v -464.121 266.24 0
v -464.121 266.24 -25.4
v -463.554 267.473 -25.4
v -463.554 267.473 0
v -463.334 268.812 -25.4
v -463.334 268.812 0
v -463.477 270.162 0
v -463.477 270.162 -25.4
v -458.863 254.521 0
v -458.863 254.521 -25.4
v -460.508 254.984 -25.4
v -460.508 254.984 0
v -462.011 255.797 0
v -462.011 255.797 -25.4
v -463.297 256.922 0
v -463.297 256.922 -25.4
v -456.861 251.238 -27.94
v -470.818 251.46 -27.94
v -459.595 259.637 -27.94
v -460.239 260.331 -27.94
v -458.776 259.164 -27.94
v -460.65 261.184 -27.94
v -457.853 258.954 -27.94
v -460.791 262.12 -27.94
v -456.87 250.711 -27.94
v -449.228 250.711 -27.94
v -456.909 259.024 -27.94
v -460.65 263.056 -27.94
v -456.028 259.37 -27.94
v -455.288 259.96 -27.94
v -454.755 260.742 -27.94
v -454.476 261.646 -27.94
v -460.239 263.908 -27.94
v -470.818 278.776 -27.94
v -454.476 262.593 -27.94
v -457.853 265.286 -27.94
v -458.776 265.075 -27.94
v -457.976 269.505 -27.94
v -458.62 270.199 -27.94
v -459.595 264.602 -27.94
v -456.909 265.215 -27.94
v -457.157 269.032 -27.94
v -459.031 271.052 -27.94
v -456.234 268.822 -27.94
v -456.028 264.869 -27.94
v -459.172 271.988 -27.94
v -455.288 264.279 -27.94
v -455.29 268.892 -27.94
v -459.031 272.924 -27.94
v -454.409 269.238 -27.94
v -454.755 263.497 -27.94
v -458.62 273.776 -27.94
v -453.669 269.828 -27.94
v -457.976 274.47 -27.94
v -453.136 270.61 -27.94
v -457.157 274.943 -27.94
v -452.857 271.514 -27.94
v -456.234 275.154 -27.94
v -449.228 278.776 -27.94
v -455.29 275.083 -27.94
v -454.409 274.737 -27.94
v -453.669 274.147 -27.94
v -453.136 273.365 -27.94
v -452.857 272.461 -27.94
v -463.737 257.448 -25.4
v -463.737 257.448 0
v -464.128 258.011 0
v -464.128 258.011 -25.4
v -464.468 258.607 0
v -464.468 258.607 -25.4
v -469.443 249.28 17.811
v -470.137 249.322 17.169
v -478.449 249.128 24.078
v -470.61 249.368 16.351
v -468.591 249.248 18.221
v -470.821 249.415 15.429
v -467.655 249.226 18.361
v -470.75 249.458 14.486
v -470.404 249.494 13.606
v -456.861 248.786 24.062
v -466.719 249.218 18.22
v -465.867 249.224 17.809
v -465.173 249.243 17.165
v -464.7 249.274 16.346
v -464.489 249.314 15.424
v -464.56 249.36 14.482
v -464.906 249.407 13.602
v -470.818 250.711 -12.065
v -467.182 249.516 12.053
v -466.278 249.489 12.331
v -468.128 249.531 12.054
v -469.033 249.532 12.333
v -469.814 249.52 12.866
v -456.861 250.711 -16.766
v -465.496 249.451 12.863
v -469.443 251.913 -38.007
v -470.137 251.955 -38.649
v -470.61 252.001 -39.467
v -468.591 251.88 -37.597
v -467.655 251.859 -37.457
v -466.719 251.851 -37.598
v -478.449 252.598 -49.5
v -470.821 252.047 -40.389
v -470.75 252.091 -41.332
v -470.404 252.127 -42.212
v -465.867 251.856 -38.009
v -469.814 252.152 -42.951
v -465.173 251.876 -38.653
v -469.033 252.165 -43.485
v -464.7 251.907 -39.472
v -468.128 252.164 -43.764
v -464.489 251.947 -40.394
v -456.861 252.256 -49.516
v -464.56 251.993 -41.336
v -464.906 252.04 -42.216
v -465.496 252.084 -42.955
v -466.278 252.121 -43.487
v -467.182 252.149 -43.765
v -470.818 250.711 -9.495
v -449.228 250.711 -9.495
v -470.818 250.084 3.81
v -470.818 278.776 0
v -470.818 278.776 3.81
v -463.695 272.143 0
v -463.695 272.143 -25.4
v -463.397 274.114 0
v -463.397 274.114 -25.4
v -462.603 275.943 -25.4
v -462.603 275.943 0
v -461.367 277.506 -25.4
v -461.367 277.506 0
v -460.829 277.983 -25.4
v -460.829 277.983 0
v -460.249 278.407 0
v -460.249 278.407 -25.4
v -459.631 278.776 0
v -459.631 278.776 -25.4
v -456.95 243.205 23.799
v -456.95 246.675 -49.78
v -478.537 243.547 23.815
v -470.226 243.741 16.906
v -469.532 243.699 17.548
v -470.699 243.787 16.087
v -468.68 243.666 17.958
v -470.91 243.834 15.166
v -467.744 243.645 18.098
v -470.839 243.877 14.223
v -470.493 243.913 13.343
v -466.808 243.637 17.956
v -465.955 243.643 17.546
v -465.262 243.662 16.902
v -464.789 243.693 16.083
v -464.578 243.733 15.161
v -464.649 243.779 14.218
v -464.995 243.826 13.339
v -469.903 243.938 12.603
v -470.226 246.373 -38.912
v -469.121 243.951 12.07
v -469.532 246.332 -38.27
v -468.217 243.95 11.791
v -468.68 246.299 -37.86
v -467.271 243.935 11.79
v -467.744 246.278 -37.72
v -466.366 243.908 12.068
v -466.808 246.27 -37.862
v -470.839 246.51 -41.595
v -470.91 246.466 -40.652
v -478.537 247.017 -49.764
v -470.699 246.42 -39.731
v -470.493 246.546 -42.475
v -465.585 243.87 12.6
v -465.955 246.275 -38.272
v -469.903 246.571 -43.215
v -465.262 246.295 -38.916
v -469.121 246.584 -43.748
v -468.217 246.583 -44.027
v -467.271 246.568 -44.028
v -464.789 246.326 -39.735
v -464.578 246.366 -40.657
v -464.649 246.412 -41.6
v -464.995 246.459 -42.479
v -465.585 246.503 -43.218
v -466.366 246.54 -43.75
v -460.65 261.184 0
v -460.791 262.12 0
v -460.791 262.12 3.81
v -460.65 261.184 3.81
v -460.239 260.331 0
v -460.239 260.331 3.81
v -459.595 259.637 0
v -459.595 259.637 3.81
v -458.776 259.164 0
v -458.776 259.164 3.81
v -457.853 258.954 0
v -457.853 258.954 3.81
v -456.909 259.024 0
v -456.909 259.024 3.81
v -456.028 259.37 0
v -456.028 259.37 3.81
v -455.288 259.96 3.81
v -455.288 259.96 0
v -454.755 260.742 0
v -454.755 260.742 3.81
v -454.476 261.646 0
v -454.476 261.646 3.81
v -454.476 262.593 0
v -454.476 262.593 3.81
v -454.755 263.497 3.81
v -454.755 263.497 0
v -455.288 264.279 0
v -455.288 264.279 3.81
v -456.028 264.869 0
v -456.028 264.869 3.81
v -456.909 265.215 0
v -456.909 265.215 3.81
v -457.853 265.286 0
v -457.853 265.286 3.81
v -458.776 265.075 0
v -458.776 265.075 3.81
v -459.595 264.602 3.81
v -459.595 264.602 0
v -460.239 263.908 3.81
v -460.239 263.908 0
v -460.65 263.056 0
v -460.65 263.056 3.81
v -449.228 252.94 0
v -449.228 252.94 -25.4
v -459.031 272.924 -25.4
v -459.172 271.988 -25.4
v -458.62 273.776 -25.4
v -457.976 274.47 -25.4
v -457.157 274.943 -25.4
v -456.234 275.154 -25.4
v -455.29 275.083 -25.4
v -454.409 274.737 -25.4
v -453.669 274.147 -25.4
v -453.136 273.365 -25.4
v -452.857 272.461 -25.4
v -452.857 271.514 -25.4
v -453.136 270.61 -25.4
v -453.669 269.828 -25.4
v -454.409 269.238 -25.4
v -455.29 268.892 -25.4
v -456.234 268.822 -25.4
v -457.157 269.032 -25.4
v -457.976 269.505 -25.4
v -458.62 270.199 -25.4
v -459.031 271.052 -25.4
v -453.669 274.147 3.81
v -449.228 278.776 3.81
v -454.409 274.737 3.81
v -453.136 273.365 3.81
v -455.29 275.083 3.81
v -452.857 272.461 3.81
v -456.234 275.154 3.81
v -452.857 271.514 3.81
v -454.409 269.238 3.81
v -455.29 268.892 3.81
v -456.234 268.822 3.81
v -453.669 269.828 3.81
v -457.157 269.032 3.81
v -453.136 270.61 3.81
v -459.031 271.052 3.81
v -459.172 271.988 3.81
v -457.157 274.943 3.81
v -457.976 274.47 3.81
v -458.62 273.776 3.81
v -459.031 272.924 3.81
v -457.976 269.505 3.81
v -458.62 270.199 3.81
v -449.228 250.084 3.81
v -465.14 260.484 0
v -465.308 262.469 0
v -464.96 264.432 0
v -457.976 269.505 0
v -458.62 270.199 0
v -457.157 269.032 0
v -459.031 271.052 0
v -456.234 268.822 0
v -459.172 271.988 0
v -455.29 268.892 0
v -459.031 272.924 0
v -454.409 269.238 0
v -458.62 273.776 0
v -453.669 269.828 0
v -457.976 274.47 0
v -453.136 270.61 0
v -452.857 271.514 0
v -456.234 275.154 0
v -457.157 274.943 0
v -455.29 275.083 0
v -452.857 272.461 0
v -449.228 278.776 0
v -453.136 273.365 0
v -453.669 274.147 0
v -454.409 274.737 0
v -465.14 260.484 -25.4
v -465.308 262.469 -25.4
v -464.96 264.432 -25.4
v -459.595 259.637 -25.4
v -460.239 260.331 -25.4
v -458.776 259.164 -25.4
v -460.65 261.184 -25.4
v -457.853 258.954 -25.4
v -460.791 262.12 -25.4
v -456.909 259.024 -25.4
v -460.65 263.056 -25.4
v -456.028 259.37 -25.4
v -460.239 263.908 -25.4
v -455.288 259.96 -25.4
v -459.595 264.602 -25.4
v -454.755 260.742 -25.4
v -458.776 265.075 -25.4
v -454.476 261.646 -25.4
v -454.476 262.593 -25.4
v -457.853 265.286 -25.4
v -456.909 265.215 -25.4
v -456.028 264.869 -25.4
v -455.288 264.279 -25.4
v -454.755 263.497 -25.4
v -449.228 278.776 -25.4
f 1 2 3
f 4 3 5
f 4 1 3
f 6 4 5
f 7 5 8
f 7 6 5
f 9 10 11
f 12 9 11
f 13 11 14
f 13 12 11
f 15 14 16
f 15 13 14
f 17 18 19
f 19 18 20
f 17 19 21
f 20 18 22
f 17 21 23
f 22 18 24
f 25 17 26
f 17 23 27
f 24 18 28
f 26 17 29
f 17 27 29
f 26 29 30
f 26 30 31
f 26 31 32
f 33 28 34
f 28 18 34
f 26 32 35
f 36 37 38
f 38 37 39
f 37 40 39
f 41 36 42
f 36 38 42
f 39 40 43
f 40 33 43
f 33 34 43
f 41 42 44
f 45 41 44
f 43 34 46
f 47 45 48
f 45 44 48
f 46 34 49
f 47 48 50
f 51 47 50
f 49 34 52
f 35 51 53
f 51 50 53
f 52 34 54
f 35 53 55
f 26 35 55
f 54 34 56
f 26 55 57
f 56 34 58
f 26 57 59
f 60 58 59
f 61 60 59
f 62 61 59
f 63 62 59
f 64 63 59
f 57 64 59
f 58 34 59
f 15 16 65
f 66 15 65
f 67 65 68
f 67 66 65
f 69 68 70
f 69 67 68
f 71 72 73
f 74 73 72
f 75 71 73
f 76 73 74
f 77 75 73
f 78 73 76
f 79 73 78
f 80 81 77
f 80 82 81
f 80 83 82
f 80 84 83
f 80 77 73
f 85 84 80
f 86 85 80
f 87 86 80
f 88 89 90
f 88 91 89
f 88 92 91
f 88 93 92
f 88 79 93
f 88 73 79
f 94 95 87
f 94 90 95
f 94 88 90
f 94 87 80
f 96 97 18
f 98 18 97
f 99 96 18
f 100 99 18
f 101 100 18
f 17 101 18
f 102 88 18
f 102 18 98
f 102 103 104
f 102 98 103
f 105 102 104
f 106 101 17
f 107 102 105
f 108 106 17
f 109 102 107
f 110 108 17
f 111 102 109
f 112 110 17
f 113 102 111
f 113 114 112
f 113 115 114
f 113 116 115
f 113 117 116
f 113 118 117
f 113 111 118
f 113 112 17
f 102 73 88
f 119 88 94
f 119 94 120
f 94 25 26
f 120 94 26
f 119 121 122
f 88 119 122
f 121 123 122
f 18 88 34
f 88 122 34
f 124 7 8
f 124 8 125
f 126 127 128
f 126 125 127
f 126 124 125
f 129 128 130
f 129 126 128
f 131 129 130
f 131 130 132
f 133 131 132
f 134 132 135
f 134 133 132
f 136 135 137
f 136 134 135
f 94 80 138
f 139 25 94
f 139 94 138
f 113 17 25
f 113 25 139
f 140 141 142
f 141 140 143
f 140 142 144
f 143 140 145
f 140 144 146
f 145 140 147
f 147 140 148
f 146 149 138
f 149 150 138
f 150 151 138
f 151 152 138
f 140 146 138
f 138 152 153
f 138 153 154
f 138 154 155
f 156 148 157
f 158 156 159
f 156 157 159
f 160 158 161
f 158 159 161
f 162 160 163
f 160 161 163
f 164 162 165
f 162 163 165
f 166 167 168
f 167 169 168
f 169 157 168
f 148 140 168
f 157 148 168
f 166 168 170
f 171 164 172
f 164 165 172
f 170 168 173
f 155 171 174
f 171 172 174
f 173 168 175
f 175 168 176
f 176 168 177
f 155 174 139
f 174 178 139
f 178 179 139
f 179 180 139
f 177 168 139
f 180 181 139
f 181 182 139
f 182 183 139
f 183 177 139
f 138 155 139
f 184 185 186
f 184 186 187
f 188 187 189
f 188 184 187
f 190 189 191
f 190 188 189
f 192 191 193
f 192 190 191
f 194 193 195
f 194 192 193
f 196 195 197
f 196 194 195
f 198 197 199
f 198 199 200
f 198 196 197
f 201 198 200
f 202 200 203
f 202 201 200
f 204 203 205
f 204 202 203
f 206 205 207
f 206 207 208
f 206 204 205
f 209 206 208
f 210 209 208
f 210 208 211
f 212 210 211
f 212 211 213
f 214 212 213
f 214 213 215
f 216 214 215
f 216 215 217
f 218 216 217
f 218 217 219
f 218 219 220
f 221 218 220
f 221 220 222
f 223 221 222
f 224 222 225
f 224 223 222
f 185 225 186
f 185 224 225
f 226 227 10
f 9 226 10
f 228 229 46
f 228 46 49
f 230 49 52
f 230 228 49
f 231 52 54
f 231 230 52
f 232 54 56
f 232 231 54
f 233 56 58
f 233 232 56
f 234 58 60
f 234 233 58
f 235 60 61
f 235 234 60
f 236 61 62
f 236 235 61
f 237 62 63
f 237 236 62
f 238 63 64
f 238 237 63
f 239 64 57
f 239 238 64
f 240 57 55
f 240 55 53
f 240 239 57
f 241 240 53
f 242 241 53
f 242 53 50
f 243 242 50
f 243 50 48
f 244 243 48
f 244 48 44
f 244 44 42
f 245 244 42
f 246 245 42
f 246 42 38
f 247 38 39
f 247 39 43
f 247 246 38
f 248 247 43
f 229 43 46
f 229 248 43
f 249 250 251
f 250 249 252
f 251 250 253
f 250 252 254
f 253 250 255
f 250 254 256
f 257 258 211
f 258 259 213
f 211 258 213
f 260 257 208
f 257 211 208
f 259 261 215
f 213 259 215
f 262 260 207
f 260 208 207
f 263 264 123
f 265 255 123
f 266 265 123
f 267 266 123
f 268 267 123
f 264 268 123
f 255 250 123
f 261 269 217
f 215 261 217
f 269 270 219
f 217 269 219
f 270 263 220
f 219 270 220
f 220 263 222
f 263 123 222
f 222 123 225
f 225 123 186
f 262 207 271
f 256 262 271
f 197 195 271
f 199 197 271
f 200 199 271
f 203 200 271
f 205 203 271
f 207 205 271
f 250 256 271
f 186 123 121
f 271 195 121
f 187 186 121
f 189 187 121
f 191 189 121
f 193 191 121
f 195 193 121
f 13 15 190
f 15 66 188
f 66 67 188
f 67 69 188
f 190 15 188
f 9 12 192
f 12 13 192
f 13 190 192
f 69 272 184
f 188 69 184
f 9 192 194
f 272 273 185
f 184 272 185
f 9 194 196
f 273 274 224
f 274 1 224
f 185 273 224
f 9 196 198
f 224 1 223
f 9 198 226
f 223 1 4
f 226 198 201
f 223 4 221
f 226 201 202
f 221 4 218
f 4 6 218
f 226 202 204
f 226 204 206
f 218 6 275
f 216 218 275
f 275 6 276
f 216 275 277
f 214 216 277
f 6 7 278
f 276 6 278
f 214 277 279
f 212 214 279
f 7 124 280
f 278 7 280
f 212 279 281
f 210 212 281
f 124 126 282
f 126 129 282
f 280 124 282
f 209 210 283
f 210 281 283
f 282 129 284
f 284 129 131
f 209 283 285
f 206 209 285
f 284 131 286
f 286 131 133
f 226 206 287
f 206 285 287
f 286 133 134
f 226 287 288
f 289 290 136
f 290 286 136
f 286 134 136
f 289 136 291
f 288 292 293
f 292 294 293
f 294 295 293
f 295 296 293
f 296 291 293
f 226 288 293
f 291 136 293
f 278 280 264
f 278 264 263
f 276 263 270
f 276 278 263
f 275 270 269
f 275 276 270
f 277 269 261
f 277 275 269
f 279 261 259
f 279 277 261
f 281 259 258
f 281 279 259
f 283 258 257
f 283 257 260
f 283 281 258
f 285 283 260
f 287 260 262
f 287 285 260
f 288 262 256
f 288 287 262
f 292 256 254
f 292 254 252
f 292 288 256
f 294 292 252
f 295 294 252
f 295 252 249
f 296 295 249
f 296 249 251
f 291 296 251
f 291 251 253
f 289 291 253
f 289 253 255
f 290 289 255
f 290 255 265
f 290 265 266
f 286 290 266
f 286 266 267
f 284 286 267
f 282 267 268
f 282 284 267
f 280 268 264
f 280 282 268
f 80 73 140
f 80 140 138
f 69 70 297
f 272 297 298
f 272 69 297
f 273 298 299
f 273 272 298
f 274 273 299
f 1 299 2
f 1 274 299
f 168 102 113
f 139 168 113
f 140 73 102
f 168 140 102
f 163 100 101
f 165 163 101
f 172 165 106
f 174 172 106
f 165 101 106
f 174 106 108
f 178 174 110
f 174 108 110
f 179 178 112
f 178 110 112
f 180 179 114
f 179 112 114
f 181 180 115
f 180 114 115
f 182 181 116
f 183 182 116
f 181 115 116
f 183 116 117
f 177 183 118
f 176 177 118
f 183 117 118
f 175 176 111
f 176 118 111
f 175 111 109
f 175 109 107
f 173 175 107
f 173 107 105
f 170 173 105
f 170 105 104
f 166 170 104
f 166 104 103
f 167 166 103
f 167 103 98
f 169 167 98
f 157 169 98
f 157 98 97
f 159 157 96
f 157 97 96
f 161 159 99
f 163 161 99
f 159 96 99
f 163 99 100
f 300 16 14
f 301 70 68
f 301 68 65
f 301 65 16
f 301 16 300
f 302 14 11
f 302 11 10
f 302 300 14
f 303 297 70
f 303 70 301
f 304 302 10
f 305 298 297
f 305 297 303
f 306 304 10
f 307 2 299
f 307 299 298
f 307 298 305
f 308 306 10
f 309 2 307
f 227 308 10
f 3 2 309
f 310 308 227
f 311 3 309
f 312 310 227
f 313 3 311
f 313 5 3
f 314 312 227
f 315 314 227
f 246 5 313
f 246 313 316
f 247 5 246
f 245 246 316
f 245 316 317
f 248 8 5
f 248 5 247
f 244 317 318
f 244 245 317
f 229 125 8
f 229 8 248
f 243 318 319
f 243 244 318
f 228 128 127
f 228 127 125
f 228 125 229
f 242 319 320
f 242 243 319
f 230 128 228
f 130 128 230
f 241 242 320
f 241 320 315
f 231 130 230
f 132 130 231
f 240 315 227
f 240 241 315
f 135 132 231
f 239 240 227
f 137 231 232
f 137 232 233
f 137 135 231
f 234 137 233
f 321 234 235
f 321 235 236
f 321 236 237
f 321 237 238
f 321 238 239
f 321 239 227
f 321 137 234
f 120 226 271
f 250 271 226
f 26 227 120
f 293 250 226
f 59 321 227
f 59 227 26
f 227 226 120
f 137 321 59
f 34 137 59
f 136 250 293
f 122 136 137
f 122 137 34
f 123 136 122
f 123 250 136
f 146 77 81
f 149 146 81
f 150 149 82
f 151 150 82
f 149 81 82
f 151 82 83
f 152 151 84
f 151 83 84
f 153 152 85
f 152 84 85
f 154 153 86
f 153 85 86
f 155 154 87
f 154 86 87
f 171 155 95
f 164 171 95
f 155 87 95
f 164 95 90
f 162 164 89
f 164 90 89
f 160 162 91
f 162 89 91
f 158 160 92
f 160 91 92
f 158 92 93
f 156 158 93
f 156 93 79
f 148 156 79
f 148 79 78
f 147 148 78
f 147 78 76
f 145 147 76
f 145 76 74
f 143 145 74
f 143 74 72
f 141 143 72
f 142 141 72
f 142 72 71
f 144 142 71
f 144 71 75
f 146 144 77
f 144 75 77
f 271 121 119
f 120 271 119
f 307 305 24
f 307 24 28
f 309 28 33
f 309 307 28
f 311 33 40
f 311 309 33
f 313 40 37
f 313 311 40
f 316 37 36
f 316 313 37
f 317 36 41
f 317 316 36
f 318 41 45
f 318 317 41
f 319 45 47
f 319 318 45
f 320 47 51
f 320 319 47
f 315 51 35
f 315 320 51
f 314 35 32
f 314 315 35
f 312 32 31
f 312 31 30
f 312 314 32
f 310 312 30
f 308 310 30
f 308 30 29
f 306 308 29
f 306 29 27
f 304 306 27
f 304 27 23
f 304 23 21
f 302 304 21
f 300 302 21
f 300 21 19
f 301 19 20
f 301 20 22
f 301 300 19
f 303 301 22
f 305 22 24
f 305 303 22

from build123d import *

# Parameters (mm, degrees)
BOSS_EXTRUDE1_DEPTH = 27.94
SKETCH2_W           = 21.59
SKETCH2_H           = 28.064626237
SKETCH2_R           = 3.175
BOSS_EXTRUDE2_DEPTH = 3.81
SKETCH3_R           = 3.175
BOSS_EXTRUDE3_DEPTH = 2.54
SKETCH4_W           = 21.59
SKETCH4_H           = 73.66
SKETCH4_R           = 3.175
BOSS_EXTRUDE4_DEPTH = 5.588
BOSS_EXTRUDE5_DEPTH = 21.59


with BuildPart() as part:
    # Sketch1 → Boss-Extrude1 (new body)
    with BuildSketch(Plane.XY):
        with BuildLine():
            ThreePointArc((-461.366897066, 277.506071532), (-460.543620658, 278.201967285), (-459.631228606, 278.776071532))
            Line((-459.631228606, 278.776071532), (-470.817858916, 278.776071532))
            Line((-470.817858916, 278.776071532), (-470.817858916, 250.711445295))
            Line((-470.817858916, 250.711445295), (-449.227858916, 250.711445295))
            Line((-449.227858916, 250.711445295), (-449.227858916, 252.940469765))
            Line((-449.227858916, 252.940469765), (-458.862647092, 254.521445295))
            ThreePointArc((-458.862647092, 254.521445295), (-461.281801172, 255.348530126), (-463.296789086, 256.922124572))
            ThreePointArc((-463.296789086, 256.922124572), (-463.938709782, 257.725469547), (-464.467858916, 258.607187485))
            ThreePointArc((-464.467858916, 258.607187485), (-465.307742726, 262.469481888), (-464.120754615, 266.239598875))
            ThreePointArc((-464.120754615, 266.239598875), (-463.399405765, 268.135304283), (-463.477224231, 270.162121354))
            ThreePointArc((-463.477224231, 270.162121354), (-463.397272377, 274.114329254), (-461.366897066, 277.506071532))
        make_face()
    extrude(amount=-BOSS_EXTRUDE1_DEPTH)

    # Sketch2 → Boss-Extrude2 (add)
    with BuildSketch(Plane.XY):
        with Locations((-460.022858916, 264.743758414)):
            Rectangle(SKETCH2_W, SKETCH2_H)
        with Locations(Location((-455.996603091, 271.987703521, 0), (0, 0, 180))):
            Circle(SKETCH2_R, mode=Mode.SUBTRACT)
        with Locations(Location((-457.615851502, 262.119672583, 0), (0, 0, 180))):
            Circle(SKETCH2_R, mode=Mode.SUBTRACT)
    extrude(amount=BOSS_EXTRUDE2_DEPTH)

    # Sketch3 → Boss-Extrude3 (add)
    with BuildSketch(Plane(origin=(0, 0, -25.4), x_dir=(-1, 0, 0), z_dir=(0, 0, -1))):
        with BuildLine():
            Line((449.227858916, 252.940469765), (449.227858916, 278.776071532))
            Line((449.227858916, 278.776071532), (459.631228606, 278.776071532))
            ThreePointArc((459.631228606, 278.776071532), (463.027763128, 275.12700781), (463.477224231, 270.162121354))
            ThreePointArc((463.477224231, 270.162121354), (463.399405765, 268.135304283), (464.120754615, 266.239598875))
            ThreePointArc((464.120754615, 266.239598875), (464.640877411, 258.967440337), (458.862647092, 254.521445295))
            Line((458.862647092, 254.521445295), (449.227858916, 252.940469765))
        make_face()
        with Locations((455.996603091, 271.987703521)):
            Circle(SKETCH3_R, mode=Mode.SUBTRACT)
        with Locations((457.615851502, 262.119672583)):
            Circle(SKETCH3_R, mode=Mode.SUBTRACT)
    extrude(amount=BOSS_EXTRUDE3_DEPTH)

    # Sketch4 → Boss-Extrude4 (add)
    with BuildSketch(Plane(origin=(3.845560936, 242.063082319, 11.417237821), x_dir=(0.9998741117550617, -0.01584934704377417, -0.0007475562269394038), z_dir=(0.01586696700779418, 0.9987637706378838, 0.04710806533037051))):
        with Locations((-471.560049375, 24.516249071)):
            Rectangle(SKETCH4_W, SKETCH4_H)
        with Locations(Location((-471.560049375, 52.456249071, 0), (0, 0, 270))):
            Circle(SKETCH4_R, mode=Mode.SUBTRACT)
        with Locations(Location((-471.560049375, -3.423750929, 0), (0, 0, 270))):
            Circle(SKETCH4_R, mode=Mode.SUBTRACT)
    extrude(amount=-BOSS_EXTRUDE4_DEPTH)

    # Sketch5 → Boss-Extrude5 (add)
    with BuildSketch(Plane.ZY.offset(470.817858916)):
        Polygon((3.81, 250.711445295), (3.81, 250.083908323), (-13.668693003, 250.908314891), align=None)
    extrude(amount=-BOSS_EXTRUDE5_DEPTH)


solid = part.part
